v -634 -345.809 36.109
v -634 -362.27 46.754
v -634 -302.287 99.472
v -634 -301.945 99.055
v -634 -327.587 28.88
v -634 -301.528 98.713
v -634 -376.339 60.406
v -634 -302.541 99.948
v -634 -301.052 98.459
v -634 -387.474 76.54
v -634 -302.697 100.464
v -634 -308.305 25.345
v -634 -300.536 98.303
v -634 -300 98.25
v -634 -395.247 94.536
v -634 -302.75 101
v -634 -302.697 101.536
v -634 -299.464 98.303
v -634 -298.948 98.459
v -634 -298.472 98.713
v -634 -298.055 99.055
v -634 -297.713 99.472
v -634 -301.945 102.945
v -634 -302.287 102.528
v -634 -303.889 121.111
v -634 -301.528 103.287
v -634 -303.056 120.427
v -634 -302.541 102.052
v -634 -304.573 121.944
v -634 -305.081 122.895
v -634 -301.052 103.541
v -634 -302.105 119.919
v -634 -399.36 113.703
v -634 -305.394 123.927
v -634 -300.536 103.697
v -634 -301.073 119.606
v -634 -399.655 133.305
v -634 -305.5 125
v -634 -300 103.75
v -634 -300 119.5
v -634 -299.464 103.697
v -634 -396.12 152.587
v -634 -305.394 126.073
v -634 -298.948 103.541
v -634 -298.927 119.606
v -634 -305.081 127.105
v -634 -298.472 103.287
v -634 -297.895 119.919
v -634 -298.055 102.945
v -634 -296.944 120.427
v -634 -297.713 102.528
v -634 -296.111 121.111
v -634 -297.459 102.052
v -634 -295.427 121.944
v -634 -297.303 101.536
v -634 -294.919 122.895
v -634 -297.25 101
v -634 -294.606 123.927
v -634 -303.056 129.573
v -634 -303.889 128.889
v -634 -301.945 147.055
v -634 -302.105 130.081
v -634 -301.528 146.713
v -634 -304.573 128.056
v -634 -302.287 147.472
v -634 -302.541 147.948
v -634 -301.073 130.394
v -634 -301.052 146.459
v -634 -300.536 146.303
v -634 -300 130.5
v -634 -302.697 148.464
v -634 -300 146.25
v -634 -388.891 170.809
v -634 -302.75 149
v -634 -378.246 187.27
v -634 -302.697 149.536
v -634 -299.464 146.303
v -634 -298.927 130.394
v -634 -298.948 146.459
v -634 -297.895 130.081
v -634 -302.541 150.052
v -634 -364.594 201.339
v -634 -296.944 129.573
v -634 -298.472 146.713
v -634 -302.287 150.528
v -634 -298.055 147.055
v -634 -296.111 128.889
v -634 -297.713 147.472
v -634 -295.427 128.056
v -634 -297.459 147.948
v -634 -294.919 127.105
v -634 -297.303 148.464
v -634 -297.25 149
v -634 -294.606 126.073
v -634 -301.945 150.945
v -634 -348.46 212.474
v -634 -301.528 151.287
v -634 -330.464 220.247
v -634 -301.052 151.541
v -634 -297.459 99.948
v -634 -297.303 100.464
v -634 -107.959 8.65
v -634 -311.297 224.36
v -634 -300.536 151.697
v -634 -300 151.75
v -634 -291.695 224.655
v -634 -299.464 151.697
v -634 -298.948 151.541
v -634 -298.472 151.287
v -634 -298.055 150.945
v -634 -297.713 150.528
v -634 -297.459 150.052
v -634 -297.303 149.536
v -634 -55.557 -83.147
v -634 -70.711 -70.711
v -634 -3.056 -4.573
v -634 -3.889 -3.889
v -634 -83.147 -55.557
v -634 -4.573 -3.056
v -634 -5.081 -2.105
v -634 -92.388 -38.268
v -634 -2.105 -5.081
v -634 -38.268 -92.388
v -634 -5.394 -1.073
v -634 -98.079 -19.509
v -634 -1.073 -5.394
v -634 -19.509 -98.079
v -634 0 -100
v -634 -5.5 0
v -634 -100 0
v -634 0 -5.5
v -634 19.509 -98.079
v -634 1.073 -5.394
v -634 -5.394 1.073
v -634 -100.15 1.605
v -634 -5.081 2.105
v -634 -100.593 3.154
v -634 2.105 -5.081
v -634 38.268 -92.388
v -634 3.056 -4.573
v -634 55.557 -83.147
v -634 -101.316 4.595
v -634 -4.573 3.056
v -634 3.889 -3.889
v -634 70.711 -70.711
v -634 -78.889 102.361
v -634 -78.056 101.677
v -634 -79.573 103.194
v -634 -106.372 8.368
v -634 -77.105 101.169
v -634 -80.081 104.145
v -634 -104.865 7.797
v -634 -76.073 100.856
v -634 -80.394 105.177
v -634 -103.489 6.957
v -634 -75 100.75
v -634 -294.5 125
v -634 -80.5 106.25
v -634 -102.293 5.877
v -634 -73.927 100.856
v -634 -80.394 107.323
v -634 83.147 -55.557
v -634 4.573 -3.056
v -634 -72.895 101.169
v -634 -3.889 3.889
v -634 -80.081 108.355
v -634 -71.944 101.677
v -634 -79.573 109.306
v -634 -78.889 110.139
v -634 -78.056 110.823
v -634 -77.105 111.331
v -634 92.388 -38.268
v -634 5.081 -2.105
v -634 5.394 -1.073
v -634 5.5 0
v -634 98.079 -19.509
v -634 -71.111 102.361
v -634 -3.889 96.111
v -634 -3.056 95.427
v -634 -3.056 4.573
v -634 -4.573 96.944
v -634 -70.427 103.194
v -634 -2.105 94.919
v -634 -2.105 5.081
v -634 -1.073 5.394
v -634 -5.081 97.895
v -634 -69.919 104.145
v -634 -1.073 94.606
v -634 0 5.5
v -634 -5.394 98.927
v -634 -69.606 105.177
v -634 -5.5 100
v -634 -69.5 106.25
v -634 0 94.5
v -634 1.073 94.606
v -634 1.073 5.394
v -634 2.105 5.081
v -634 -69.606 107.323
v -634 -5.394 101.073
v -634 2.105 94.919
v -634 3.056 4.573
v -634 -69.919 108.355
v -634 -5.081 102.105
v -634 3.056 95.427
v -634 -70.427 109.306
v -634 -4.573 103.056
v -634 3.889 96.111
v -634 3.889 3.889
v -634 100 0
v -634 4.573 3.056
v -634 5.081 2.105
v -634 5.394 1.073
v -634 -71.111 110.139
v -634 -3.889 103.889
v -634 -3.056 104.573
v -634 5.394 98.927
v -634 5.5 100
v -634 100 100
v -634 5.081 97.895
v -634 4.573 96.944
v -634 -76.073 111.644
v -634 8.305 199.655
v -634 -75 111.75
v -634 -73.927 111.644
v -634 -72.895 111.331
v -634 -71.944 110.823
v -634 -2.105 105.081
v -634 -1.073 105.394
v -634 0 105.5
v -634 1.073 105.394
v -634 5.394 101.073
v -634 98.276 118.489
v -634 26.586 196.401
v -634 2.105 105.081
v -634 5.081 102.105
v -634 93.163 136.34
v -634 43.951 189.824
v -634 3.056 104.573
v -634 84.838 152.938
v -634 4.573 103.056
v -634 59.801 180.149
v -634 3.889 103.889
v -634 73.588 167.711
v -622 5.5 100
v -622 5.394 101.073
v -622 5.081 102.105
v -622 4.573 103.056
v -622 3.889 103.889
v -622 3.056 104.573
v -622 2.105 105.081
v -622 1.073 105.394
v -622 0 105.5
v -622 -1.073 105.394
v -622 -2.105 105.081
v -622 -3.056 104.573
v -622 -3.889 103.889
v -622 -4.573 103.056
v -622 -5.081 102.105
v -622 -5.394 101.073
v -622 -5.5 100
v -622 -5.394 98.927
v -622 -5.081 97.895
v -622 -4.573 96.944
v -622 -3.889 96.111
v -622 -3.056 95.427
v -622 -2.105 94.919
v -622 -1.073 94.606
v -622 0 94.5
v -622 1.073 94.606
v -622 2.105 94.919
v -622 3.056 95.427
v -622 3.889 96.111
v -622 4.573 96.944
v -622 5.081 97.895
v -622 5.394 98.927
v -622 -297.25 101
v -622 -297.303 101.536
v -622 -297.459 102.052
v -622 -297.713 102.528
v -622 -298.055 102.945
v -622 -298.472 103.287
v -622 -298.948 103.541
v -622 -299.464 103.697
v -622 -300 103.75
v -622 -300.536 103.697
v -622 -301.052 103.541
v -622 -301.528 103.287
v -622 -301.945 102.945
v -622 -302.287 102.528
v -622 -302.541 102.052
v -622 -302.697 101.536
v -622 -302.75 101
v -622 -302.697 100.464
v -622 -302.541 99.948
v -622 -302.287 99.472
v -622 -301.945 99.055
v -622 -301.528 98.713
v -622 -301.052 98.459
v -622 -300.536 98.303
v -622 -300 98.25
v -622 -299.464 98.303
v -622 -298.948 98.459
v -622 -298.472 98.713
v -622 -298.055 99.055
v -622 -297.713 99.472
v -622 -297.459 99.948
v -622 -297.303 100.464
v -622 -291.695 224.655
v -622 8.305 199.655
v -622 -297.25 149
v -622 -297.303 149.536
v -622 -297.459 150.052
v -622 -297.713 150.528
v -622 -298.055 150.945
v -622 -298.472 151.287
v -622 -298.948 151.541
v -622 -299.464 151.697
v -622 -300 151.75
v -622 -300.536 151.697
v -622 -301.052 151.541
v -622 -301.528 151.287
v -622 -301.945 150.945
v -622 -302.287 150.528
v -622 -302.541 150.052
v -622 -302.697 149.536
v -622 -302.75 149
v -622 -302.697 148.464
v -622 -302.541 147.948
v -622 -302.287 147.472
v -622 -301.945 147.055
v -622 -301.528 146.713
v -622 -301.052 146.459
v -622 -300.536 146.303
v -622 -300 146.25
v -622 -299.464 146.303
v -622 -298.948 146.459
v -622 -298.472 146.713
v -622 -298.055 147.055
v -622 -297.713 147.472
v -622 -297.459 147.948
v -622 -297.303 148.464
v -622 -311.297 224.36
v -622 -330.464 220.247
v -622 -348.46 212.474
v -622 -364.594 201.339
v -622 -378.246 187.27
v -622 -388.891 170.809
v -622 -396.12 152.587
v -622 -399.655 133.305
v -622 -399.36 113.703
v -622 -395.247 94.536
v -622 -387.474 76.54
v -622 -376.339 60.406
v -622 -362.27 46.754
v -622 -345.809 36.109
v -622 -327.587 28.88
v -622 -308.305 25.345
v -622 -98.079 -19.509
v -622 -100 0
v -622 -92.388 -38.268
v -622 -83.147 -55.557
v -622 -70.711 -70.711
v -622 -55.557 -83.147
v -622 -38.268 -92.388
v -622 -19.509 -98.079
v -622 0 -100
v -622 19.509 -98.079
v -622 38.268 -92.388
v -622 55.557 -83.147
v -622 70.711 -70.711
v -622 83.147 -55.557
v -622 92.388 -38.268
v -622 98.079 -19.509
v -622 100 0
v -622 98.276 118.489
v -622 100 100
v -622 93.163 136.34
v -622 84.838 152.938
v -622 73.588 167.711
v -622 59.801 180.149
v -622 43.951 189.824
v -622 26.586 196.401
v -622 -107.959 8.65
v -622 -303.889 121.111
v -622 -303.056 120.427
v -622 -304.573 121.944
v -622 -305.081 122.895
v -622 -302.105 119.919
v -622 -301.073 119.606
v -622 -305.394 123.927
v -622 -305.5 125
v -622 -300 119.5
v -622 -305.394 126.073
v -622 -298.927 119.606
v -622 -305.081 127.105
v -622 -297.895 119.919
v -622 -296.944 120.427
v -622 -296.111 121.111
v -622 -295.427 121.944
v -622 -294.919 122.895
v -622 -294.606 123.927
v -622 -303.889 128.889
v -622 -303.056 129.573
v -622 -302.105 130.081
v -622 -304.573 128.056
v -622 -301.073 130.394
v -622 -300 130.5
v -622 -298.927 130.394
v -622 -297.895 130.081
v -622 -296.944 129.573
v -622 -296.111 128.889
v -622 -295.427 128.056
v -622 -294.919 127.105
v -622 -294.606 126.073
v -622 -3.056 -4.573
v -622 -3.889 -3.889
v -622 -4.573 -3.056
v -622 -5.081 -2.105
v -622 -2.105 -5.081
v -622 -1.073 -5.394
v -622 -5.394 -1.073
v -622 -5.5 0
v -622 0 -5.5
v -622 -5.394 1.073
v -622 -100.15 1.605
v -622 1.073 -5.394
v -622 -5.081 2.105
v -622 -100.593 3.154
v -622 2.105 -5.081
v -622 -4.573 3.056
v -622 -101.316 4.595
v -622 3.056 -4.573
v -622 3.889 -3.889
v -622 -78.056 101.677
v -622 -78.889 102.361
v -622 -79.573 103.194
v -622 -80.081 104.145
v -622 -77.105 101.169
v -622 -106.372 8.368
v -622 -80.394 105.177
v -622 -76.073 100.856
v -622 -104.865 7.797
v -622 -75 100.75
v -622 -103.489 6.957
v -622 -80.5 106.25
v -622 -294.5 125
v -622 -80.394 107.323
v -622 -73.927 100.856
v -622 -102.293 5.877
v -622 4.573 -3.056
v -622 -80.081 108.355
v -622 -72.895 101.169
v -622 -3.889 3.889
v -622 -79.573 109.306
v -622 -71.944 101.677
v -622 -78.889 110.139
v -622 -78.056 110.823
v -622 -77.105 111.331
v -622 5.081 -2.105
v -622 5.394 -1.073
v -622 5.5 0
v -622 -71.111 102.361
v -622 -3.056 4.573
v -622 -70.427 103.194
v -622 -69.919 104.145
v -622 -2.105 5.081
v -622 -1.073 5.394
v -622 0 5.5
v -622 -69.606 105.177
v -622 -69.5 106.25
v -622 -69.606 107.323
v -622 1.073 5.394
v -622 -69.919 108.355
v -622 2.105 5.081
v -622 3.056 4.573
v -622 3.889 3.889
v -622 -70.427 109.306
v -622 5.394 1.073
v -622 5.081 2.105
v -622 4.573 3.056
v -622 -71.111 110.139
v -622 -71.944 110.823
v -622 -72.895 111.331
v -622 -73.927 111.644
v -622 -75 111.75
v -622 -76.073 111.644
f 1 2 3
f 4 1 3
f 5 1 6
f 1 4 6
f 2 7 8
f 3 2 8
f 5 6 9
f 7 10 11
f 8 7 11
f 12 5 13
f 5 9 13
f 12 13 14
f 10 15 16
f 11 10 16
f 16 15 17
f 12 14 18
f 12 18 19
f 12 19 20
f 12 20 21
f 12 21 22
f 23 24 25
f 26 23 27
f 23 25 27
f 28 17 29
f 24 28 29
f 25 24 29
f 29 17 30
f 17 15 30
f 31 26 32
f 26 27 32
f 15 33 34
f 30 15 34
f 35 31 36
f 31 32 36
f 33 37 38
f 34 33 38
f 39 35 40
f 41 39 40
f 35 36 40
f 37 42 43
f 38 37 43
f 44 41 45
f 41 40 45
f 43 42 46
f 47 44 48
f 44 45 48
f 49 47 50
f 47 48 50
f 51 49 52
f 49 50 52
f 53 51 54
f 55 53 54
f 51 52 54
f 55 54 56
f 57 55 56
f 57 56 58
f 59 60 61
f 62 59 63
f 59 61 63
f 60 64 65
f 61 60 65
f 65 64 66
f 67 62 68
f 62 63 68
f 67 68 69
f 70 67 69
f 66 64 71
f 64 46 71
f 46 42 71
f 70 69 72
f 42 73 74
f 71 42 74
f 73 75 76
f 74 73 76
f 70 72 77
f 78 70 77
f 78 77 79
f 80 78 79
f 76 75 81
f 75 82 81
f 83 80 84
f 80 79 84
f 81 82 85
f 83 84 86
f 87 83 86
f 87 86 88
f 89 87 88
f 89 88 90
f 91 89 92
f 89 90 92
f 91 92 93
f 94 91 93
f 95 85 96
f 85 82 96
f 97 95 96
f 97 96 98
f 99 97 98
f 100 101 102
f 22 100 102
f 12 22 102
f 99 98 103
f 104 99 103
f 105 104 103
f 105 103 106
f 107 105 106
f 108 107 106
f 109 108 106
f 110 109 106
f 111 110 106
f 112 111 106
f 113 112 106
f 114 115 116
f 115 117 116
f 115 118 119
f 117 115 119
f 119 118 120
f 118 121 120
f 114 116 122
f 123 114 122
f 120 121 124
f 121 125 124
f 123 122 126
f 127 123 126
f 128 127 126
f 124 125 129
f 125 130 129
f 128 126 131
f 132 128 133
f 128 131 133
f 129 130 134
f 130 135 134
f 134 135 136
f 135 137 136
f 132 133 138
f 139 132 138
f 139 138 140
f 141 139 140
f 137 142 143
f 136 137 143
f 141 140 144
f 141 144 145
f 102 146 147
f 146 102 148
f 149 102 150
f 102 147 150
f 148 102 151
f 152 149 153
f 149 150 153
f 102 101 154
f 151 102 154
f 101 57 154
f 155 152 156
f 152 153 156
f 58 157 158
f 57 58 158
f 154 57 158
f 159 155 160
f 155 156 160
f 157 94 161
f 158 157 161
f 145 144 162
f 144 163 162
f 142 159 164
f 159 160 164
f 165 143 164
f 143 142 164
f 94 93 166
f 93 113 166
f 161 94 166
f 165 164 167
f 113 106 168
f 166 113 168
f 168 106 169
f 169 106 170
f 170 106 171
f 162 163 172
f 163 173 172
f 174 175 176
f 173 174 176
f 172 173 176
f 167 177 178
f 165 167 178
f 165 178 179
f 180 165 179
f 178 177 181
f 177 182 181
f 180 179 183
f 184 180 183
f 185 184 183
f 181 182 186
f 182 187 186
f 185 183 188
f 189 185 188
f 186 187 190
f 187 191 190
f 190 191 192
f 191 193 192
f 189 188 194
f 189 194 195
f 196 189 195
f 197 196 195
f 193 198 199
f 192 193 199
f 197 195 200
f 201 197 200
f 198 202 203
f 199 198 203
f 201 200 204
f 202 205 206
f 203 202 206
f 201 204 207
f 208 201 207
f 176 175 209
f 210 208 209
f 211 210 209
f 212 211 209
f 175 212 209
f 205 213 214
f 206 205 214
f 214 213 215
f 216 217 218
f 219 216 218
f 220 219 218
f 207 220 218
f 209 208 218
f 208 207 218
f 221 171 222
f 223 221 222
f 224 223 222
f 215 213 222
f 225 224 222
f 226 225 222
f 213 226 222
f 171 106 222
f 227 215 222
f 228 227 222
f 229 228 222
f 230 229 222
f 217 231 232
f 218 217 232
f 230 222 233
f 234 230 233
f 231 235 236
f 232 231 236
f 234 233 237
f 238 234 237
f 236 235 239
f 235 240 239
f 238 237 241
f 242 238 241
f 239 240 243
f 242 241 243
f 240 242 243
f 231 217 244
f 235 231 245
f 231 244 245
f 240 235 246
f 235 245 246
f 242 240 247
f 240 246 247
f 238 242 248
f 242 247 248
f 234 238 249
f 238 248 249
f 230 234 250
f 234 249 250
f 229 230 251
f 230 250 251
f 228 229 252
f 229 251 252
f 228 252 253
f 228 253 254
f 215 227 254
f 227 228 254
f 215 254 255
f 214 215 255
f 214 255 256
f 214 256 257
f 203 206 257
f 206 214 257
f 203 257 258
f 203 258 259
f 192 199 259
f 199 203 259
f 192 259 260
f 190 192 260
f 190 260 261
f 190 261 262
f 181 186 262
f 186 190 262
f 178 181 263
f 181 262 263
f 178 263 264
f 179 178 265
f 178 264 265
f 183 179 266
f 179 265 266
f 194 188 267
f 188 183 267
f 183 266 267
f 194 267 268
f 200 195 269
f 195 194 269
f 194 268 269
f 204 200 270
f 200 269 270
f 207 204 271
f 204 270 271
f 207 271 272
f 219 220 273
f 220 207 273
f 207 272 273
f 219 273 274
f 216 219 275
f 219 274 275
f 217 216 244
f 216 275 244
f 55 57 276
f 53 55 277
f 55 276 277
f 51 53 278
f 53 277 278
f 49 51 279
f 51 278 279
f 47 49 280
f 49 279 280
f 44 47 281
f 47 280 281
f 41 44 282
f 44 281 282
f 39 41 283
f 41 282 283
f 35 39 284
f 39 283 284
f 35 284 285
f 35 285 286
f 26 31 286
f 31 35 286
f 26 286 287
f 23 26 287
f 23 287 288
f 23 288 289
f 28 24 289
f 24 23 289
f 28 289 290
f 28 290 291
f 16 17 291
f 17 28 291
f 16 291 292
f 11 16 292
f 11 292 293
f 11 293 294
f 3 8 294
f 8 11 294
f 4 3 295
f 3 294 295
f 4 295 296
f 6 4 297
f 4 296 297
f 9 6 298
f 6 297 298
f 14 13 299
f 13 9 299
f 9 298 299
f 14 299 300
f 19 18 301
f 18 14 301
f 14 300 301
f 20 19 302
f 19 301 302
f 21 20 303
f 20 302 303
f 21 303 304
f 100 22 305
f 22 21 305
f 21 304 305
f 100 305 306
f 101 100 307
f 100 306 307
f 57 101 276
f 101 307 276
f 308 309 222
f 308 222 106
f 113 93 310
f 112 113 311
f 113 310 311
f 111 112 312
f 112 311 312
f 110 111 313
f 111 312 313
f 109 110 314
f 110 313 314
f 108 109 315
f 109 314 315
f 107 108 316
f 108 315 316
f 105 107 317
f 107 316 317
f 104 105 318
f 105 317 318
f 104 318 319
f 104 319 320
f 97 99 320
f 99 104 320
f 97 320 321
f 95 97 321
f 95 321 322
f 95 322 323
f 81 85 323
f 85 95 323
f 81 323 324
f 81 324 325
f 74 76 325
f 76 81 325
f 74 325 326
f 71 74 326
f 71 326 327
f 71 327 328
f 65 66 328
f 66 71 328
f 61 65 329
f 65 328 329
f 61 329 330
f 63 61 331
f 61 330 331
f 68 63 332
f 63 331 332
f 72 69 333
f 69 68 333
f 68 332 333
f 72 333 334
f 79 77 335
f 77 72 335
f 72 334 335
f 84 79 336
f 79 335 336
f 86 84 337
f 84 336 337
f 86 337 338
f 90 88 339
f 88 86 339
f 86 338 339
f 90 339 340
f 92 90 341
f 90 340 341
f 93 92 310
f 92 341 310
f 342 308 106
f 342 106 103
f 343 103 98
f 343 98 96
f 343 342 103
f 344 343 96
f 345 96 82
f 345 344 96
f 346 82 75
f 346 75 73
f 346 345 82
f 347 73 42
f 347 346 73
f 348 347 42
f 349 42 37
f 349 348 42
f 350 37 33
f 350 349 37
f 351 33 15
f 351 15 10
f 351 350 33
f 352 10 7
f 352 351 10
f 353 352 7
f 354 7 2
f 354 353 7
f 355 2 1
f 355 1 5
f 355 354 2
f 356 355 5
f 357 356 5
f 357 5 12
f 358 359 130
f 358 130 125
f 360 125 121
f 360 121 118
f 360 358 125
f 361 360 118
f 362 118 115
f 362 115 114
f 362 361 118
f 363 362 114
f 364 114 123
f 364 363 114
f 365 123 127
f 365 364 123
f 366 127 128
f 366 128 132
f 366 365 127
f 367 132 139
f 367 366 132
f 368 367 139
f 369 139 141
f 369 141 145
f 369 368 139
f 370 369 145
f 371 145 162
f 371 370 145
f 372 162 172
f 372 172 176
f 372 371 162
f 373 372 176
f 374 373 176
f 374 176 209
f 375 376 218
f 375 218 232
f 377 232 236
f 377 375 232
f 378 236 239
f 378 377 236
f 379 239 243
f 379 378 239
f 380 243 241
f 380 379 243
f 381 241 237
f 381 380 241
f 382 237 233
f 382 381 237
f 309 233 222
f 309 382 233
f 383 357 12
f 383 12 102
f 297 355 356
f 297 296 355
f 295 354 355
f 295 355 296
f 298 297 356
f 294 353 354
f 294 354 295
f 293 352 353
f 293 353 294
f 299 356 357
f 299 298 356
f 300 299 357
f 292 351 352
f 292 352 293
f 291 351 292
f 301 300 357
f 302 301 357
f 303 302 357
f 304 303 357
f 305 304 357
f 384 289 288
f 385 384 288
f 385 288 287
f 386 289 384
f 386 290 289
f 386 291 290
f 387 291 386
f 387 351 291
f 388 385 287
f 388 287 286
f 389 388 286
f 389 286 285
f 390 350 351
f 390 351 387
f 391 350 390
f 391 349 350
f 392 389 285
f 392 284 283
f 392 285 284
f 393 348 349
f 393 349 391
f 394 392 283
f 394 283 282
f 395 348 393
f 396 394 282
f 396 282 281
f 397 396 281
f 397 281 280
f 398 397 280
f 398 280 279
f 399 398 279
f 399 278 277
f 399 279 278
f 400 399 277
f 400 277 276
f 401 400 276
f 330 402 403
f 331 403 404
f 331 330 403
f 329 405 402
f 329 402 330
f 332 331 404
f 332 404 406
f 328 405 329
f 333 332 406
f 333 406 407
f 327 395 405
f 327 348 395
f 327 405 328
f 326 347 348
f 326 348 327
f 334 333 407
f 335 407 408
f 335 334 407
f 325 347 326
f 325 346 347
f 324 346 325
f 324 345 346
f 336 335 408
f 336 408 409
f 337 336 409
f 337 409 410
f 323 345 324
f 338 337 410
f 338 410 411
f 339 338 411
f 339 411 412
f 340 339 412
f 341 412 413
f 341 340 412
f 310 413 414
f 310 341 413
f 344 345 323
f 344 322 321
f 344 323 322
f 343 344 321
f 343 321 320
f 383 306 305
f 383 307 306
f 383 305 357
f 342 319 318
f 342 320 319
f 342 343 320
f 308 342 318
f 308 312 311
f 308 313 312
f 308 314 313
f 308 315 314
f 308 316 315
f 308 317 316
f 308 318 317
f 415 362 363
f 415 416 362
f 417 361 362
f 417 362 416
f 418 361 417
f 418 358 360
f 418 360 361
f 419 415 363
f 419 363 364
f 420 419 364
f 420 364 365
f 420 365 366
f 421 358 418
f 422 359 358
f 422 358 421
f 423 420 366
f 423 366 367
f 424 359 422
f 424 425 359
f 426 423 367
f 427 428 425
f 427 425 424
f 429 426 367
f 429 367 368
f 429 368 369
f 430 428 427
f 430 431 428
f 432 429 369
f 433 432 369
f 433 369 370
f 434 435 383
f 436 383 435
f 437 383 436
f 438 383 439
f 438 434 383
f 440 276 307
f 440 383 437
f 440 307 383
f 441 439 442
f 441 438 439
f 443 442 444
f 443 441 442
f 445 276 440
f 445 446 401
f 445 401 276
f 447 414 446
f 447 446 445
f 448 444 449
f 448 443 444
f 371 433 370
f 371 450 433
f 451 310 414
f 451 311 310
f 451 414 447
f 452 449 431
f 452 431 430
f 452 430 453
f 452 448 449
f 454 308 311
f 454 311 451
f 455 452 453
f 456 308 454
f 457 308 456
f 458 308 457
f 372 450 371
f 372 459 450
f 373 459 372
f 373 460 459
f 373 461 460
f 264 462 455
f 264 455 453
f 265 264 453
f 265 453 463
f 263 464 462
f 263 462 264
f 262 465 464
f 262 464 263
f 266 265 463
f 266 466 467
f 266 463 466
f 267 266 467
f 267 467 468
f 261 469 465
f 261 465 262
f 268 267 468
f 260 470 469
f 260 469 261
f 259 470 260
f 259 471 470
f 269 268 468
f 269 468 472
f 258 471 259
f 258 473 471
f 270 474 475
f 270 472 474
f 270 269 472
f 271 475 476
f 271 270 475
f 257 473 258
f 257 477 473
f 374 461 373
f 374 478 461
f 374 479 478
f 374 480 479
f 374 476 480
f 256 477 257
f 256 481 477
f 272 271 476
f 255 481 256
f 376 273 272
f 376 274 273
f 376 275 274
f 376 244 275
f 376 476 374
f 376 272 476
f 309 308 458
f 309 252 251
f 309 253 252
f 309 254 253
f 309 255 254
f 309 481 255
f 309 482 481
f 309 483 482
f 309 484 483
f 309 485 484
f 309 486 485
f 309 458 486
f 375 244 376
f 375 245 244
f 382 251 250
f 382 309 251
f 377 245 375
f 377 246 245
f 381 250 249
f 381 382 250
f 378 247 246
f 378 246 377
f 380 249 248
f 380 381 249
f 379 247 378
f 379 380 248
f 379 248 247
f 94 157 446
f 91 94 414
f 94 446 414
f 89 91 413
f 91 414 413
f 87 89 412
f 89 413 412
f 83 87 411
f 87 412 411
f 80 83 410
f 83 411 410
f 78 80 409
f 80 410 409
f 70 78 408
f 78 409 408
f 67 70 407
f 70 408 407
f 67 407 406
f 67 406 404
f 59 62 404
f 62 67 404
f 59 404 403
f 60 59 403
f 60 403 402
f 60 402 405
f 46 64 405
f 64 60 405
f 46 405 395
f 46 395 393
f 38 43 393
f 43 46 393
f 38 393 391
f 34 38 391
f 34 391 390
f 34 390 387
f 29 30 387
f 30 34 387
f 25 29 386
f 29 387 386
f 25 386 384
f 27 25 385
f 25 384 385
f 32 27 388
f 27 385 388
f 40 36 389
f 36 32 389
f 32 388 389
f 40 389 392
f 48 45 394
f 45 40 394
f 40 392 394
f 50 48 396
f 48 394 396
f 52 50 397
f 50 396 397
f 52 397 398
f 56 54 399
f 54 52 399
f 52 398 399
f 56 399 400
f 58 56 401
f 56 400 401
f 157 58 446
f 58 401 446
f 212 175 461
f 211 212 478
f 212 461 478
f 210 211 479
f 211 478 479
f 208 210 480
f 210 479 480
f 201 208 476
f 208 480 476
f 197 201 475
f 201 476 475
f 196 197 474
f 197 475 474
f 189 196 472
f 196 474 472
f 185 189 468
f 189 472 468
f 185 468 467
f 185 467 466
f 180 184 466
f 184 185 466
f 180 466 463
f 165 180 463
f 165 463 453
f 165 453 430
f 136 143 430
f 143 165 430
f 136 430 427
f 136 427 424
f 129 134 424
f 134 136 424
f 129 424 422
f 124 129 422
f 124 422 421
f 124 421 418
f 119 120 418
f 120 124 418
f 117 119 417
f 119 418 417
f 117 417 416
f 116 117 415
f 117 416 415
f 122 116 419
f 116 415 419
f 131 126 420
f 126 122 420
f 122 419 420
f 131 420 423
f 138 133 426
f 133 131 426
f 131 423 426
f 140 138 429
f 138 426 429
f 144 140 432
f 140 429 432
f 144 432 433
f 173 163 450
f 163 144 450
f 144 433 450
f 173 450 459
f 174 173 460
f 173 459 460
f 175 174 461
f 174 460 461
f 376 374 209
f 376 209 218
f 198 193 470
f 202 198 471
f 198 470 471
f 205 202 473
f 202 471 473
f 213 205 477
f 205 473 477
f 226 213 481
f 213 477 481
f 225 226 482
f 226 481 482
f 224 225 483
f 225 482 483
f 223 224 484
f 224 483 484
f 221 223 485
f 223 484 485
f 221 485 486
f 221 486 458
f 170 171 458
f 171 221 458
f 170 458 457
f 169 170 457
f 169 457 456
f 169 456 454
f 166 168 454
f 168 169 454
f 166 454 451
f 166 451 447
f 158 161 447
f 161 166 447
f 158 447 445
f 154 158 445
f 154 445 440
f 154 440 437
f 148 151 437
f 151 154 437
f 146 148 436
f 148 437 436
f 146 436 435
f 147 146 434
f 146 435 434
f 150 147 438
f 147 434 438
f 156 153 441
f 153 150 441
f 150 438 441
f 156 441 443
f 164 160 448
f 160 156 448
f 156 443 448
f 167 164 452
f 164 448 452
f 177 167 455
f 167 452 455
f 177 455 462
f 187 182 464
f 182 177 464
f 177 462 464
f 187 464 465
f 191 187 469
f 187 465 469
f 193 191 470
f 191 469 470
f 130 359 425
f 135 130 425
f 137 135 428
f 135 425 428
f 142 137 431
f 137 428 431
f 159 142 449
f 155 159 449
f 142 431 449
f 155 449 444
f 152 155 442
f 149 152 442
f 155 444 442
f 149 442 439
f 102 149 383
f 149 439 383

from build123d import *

# Parameters (mm, degrees)
PAD003_DEPTH  = 12
SKETCH009_R   = 5.5
HOLE001_DEPTH = 12.001
SKETCH038_R   = 2.75
HOLE005_DEPTH = 12.001


with BuildPart() as arm_left:
    # Sketch008 → Pad003 (new body)
    with BuildSketch(Plane.YZ):
        with BuildLine():
            ThreePointArc((100, 100), (73.588229, 167.710949), (8.304548, 199.654576))
            Line((8.304548, 199.654576), (-291.695452, 224.654576))
            ThreePointArc((-291.695452, 224.654576), (-399.654576, 133.304548), (-308.304548, 25.345424))
            Line((-308.304548, 25.345424), (-107.959124, 8.649972))
            ThreePointArc((-100, 0), (-102.29253, 5.87728), (-107.959124, 8.649972))
            ThreePointArc((-100, 0), (0, -100), (100, 0))
            Line((100, 0), (100, 100))
        make_face()
    extrude(amount=PAD003_DEPTH)

    # Sketch009 → Hole001 (cut, through all)
    with BuildSketch(Plane.YZ):
        with Locations((-300, 125)):
            Circle(SKETCH009_R)
        with Locations((0, 100)):
            Circle(SKETCH009_R)
        Circle(SKETCH009_R)
        with Locations((-75, 106.25)):
            Circle(SKETCH009_R)
    extrude(amount=HOLE001_DEPTH, mode=Mode.SUBTRACT)

    # Sketch038 → Hole005 (cut, through all)
    with BuildSketch(Plane.YZ):
        with Locations((-300, 149)):
            Circle(SKETCH038_R)
        with Locations((-300, 101)):
            Circle(SKETCH038_R)
    extrude(amount=HOLE005_DEPTH, mode=Mode.SUBTRACT)


with BuildPart() as arm_left_1:
    # Body004 placement: moved
    add(arm_left.part.moved(Location((622, 0, 0))))


with BuildPart() as arm_right:
    # Part__Mirroring001: instance of arm_left
    add(arm_left_1.part.mirror(Plane(origin=(4e-06, -149.827286, 62.327362), x_dir=(0, -1, 0), z_dir=(1, 0, 0))))


solid = arm_right.part
